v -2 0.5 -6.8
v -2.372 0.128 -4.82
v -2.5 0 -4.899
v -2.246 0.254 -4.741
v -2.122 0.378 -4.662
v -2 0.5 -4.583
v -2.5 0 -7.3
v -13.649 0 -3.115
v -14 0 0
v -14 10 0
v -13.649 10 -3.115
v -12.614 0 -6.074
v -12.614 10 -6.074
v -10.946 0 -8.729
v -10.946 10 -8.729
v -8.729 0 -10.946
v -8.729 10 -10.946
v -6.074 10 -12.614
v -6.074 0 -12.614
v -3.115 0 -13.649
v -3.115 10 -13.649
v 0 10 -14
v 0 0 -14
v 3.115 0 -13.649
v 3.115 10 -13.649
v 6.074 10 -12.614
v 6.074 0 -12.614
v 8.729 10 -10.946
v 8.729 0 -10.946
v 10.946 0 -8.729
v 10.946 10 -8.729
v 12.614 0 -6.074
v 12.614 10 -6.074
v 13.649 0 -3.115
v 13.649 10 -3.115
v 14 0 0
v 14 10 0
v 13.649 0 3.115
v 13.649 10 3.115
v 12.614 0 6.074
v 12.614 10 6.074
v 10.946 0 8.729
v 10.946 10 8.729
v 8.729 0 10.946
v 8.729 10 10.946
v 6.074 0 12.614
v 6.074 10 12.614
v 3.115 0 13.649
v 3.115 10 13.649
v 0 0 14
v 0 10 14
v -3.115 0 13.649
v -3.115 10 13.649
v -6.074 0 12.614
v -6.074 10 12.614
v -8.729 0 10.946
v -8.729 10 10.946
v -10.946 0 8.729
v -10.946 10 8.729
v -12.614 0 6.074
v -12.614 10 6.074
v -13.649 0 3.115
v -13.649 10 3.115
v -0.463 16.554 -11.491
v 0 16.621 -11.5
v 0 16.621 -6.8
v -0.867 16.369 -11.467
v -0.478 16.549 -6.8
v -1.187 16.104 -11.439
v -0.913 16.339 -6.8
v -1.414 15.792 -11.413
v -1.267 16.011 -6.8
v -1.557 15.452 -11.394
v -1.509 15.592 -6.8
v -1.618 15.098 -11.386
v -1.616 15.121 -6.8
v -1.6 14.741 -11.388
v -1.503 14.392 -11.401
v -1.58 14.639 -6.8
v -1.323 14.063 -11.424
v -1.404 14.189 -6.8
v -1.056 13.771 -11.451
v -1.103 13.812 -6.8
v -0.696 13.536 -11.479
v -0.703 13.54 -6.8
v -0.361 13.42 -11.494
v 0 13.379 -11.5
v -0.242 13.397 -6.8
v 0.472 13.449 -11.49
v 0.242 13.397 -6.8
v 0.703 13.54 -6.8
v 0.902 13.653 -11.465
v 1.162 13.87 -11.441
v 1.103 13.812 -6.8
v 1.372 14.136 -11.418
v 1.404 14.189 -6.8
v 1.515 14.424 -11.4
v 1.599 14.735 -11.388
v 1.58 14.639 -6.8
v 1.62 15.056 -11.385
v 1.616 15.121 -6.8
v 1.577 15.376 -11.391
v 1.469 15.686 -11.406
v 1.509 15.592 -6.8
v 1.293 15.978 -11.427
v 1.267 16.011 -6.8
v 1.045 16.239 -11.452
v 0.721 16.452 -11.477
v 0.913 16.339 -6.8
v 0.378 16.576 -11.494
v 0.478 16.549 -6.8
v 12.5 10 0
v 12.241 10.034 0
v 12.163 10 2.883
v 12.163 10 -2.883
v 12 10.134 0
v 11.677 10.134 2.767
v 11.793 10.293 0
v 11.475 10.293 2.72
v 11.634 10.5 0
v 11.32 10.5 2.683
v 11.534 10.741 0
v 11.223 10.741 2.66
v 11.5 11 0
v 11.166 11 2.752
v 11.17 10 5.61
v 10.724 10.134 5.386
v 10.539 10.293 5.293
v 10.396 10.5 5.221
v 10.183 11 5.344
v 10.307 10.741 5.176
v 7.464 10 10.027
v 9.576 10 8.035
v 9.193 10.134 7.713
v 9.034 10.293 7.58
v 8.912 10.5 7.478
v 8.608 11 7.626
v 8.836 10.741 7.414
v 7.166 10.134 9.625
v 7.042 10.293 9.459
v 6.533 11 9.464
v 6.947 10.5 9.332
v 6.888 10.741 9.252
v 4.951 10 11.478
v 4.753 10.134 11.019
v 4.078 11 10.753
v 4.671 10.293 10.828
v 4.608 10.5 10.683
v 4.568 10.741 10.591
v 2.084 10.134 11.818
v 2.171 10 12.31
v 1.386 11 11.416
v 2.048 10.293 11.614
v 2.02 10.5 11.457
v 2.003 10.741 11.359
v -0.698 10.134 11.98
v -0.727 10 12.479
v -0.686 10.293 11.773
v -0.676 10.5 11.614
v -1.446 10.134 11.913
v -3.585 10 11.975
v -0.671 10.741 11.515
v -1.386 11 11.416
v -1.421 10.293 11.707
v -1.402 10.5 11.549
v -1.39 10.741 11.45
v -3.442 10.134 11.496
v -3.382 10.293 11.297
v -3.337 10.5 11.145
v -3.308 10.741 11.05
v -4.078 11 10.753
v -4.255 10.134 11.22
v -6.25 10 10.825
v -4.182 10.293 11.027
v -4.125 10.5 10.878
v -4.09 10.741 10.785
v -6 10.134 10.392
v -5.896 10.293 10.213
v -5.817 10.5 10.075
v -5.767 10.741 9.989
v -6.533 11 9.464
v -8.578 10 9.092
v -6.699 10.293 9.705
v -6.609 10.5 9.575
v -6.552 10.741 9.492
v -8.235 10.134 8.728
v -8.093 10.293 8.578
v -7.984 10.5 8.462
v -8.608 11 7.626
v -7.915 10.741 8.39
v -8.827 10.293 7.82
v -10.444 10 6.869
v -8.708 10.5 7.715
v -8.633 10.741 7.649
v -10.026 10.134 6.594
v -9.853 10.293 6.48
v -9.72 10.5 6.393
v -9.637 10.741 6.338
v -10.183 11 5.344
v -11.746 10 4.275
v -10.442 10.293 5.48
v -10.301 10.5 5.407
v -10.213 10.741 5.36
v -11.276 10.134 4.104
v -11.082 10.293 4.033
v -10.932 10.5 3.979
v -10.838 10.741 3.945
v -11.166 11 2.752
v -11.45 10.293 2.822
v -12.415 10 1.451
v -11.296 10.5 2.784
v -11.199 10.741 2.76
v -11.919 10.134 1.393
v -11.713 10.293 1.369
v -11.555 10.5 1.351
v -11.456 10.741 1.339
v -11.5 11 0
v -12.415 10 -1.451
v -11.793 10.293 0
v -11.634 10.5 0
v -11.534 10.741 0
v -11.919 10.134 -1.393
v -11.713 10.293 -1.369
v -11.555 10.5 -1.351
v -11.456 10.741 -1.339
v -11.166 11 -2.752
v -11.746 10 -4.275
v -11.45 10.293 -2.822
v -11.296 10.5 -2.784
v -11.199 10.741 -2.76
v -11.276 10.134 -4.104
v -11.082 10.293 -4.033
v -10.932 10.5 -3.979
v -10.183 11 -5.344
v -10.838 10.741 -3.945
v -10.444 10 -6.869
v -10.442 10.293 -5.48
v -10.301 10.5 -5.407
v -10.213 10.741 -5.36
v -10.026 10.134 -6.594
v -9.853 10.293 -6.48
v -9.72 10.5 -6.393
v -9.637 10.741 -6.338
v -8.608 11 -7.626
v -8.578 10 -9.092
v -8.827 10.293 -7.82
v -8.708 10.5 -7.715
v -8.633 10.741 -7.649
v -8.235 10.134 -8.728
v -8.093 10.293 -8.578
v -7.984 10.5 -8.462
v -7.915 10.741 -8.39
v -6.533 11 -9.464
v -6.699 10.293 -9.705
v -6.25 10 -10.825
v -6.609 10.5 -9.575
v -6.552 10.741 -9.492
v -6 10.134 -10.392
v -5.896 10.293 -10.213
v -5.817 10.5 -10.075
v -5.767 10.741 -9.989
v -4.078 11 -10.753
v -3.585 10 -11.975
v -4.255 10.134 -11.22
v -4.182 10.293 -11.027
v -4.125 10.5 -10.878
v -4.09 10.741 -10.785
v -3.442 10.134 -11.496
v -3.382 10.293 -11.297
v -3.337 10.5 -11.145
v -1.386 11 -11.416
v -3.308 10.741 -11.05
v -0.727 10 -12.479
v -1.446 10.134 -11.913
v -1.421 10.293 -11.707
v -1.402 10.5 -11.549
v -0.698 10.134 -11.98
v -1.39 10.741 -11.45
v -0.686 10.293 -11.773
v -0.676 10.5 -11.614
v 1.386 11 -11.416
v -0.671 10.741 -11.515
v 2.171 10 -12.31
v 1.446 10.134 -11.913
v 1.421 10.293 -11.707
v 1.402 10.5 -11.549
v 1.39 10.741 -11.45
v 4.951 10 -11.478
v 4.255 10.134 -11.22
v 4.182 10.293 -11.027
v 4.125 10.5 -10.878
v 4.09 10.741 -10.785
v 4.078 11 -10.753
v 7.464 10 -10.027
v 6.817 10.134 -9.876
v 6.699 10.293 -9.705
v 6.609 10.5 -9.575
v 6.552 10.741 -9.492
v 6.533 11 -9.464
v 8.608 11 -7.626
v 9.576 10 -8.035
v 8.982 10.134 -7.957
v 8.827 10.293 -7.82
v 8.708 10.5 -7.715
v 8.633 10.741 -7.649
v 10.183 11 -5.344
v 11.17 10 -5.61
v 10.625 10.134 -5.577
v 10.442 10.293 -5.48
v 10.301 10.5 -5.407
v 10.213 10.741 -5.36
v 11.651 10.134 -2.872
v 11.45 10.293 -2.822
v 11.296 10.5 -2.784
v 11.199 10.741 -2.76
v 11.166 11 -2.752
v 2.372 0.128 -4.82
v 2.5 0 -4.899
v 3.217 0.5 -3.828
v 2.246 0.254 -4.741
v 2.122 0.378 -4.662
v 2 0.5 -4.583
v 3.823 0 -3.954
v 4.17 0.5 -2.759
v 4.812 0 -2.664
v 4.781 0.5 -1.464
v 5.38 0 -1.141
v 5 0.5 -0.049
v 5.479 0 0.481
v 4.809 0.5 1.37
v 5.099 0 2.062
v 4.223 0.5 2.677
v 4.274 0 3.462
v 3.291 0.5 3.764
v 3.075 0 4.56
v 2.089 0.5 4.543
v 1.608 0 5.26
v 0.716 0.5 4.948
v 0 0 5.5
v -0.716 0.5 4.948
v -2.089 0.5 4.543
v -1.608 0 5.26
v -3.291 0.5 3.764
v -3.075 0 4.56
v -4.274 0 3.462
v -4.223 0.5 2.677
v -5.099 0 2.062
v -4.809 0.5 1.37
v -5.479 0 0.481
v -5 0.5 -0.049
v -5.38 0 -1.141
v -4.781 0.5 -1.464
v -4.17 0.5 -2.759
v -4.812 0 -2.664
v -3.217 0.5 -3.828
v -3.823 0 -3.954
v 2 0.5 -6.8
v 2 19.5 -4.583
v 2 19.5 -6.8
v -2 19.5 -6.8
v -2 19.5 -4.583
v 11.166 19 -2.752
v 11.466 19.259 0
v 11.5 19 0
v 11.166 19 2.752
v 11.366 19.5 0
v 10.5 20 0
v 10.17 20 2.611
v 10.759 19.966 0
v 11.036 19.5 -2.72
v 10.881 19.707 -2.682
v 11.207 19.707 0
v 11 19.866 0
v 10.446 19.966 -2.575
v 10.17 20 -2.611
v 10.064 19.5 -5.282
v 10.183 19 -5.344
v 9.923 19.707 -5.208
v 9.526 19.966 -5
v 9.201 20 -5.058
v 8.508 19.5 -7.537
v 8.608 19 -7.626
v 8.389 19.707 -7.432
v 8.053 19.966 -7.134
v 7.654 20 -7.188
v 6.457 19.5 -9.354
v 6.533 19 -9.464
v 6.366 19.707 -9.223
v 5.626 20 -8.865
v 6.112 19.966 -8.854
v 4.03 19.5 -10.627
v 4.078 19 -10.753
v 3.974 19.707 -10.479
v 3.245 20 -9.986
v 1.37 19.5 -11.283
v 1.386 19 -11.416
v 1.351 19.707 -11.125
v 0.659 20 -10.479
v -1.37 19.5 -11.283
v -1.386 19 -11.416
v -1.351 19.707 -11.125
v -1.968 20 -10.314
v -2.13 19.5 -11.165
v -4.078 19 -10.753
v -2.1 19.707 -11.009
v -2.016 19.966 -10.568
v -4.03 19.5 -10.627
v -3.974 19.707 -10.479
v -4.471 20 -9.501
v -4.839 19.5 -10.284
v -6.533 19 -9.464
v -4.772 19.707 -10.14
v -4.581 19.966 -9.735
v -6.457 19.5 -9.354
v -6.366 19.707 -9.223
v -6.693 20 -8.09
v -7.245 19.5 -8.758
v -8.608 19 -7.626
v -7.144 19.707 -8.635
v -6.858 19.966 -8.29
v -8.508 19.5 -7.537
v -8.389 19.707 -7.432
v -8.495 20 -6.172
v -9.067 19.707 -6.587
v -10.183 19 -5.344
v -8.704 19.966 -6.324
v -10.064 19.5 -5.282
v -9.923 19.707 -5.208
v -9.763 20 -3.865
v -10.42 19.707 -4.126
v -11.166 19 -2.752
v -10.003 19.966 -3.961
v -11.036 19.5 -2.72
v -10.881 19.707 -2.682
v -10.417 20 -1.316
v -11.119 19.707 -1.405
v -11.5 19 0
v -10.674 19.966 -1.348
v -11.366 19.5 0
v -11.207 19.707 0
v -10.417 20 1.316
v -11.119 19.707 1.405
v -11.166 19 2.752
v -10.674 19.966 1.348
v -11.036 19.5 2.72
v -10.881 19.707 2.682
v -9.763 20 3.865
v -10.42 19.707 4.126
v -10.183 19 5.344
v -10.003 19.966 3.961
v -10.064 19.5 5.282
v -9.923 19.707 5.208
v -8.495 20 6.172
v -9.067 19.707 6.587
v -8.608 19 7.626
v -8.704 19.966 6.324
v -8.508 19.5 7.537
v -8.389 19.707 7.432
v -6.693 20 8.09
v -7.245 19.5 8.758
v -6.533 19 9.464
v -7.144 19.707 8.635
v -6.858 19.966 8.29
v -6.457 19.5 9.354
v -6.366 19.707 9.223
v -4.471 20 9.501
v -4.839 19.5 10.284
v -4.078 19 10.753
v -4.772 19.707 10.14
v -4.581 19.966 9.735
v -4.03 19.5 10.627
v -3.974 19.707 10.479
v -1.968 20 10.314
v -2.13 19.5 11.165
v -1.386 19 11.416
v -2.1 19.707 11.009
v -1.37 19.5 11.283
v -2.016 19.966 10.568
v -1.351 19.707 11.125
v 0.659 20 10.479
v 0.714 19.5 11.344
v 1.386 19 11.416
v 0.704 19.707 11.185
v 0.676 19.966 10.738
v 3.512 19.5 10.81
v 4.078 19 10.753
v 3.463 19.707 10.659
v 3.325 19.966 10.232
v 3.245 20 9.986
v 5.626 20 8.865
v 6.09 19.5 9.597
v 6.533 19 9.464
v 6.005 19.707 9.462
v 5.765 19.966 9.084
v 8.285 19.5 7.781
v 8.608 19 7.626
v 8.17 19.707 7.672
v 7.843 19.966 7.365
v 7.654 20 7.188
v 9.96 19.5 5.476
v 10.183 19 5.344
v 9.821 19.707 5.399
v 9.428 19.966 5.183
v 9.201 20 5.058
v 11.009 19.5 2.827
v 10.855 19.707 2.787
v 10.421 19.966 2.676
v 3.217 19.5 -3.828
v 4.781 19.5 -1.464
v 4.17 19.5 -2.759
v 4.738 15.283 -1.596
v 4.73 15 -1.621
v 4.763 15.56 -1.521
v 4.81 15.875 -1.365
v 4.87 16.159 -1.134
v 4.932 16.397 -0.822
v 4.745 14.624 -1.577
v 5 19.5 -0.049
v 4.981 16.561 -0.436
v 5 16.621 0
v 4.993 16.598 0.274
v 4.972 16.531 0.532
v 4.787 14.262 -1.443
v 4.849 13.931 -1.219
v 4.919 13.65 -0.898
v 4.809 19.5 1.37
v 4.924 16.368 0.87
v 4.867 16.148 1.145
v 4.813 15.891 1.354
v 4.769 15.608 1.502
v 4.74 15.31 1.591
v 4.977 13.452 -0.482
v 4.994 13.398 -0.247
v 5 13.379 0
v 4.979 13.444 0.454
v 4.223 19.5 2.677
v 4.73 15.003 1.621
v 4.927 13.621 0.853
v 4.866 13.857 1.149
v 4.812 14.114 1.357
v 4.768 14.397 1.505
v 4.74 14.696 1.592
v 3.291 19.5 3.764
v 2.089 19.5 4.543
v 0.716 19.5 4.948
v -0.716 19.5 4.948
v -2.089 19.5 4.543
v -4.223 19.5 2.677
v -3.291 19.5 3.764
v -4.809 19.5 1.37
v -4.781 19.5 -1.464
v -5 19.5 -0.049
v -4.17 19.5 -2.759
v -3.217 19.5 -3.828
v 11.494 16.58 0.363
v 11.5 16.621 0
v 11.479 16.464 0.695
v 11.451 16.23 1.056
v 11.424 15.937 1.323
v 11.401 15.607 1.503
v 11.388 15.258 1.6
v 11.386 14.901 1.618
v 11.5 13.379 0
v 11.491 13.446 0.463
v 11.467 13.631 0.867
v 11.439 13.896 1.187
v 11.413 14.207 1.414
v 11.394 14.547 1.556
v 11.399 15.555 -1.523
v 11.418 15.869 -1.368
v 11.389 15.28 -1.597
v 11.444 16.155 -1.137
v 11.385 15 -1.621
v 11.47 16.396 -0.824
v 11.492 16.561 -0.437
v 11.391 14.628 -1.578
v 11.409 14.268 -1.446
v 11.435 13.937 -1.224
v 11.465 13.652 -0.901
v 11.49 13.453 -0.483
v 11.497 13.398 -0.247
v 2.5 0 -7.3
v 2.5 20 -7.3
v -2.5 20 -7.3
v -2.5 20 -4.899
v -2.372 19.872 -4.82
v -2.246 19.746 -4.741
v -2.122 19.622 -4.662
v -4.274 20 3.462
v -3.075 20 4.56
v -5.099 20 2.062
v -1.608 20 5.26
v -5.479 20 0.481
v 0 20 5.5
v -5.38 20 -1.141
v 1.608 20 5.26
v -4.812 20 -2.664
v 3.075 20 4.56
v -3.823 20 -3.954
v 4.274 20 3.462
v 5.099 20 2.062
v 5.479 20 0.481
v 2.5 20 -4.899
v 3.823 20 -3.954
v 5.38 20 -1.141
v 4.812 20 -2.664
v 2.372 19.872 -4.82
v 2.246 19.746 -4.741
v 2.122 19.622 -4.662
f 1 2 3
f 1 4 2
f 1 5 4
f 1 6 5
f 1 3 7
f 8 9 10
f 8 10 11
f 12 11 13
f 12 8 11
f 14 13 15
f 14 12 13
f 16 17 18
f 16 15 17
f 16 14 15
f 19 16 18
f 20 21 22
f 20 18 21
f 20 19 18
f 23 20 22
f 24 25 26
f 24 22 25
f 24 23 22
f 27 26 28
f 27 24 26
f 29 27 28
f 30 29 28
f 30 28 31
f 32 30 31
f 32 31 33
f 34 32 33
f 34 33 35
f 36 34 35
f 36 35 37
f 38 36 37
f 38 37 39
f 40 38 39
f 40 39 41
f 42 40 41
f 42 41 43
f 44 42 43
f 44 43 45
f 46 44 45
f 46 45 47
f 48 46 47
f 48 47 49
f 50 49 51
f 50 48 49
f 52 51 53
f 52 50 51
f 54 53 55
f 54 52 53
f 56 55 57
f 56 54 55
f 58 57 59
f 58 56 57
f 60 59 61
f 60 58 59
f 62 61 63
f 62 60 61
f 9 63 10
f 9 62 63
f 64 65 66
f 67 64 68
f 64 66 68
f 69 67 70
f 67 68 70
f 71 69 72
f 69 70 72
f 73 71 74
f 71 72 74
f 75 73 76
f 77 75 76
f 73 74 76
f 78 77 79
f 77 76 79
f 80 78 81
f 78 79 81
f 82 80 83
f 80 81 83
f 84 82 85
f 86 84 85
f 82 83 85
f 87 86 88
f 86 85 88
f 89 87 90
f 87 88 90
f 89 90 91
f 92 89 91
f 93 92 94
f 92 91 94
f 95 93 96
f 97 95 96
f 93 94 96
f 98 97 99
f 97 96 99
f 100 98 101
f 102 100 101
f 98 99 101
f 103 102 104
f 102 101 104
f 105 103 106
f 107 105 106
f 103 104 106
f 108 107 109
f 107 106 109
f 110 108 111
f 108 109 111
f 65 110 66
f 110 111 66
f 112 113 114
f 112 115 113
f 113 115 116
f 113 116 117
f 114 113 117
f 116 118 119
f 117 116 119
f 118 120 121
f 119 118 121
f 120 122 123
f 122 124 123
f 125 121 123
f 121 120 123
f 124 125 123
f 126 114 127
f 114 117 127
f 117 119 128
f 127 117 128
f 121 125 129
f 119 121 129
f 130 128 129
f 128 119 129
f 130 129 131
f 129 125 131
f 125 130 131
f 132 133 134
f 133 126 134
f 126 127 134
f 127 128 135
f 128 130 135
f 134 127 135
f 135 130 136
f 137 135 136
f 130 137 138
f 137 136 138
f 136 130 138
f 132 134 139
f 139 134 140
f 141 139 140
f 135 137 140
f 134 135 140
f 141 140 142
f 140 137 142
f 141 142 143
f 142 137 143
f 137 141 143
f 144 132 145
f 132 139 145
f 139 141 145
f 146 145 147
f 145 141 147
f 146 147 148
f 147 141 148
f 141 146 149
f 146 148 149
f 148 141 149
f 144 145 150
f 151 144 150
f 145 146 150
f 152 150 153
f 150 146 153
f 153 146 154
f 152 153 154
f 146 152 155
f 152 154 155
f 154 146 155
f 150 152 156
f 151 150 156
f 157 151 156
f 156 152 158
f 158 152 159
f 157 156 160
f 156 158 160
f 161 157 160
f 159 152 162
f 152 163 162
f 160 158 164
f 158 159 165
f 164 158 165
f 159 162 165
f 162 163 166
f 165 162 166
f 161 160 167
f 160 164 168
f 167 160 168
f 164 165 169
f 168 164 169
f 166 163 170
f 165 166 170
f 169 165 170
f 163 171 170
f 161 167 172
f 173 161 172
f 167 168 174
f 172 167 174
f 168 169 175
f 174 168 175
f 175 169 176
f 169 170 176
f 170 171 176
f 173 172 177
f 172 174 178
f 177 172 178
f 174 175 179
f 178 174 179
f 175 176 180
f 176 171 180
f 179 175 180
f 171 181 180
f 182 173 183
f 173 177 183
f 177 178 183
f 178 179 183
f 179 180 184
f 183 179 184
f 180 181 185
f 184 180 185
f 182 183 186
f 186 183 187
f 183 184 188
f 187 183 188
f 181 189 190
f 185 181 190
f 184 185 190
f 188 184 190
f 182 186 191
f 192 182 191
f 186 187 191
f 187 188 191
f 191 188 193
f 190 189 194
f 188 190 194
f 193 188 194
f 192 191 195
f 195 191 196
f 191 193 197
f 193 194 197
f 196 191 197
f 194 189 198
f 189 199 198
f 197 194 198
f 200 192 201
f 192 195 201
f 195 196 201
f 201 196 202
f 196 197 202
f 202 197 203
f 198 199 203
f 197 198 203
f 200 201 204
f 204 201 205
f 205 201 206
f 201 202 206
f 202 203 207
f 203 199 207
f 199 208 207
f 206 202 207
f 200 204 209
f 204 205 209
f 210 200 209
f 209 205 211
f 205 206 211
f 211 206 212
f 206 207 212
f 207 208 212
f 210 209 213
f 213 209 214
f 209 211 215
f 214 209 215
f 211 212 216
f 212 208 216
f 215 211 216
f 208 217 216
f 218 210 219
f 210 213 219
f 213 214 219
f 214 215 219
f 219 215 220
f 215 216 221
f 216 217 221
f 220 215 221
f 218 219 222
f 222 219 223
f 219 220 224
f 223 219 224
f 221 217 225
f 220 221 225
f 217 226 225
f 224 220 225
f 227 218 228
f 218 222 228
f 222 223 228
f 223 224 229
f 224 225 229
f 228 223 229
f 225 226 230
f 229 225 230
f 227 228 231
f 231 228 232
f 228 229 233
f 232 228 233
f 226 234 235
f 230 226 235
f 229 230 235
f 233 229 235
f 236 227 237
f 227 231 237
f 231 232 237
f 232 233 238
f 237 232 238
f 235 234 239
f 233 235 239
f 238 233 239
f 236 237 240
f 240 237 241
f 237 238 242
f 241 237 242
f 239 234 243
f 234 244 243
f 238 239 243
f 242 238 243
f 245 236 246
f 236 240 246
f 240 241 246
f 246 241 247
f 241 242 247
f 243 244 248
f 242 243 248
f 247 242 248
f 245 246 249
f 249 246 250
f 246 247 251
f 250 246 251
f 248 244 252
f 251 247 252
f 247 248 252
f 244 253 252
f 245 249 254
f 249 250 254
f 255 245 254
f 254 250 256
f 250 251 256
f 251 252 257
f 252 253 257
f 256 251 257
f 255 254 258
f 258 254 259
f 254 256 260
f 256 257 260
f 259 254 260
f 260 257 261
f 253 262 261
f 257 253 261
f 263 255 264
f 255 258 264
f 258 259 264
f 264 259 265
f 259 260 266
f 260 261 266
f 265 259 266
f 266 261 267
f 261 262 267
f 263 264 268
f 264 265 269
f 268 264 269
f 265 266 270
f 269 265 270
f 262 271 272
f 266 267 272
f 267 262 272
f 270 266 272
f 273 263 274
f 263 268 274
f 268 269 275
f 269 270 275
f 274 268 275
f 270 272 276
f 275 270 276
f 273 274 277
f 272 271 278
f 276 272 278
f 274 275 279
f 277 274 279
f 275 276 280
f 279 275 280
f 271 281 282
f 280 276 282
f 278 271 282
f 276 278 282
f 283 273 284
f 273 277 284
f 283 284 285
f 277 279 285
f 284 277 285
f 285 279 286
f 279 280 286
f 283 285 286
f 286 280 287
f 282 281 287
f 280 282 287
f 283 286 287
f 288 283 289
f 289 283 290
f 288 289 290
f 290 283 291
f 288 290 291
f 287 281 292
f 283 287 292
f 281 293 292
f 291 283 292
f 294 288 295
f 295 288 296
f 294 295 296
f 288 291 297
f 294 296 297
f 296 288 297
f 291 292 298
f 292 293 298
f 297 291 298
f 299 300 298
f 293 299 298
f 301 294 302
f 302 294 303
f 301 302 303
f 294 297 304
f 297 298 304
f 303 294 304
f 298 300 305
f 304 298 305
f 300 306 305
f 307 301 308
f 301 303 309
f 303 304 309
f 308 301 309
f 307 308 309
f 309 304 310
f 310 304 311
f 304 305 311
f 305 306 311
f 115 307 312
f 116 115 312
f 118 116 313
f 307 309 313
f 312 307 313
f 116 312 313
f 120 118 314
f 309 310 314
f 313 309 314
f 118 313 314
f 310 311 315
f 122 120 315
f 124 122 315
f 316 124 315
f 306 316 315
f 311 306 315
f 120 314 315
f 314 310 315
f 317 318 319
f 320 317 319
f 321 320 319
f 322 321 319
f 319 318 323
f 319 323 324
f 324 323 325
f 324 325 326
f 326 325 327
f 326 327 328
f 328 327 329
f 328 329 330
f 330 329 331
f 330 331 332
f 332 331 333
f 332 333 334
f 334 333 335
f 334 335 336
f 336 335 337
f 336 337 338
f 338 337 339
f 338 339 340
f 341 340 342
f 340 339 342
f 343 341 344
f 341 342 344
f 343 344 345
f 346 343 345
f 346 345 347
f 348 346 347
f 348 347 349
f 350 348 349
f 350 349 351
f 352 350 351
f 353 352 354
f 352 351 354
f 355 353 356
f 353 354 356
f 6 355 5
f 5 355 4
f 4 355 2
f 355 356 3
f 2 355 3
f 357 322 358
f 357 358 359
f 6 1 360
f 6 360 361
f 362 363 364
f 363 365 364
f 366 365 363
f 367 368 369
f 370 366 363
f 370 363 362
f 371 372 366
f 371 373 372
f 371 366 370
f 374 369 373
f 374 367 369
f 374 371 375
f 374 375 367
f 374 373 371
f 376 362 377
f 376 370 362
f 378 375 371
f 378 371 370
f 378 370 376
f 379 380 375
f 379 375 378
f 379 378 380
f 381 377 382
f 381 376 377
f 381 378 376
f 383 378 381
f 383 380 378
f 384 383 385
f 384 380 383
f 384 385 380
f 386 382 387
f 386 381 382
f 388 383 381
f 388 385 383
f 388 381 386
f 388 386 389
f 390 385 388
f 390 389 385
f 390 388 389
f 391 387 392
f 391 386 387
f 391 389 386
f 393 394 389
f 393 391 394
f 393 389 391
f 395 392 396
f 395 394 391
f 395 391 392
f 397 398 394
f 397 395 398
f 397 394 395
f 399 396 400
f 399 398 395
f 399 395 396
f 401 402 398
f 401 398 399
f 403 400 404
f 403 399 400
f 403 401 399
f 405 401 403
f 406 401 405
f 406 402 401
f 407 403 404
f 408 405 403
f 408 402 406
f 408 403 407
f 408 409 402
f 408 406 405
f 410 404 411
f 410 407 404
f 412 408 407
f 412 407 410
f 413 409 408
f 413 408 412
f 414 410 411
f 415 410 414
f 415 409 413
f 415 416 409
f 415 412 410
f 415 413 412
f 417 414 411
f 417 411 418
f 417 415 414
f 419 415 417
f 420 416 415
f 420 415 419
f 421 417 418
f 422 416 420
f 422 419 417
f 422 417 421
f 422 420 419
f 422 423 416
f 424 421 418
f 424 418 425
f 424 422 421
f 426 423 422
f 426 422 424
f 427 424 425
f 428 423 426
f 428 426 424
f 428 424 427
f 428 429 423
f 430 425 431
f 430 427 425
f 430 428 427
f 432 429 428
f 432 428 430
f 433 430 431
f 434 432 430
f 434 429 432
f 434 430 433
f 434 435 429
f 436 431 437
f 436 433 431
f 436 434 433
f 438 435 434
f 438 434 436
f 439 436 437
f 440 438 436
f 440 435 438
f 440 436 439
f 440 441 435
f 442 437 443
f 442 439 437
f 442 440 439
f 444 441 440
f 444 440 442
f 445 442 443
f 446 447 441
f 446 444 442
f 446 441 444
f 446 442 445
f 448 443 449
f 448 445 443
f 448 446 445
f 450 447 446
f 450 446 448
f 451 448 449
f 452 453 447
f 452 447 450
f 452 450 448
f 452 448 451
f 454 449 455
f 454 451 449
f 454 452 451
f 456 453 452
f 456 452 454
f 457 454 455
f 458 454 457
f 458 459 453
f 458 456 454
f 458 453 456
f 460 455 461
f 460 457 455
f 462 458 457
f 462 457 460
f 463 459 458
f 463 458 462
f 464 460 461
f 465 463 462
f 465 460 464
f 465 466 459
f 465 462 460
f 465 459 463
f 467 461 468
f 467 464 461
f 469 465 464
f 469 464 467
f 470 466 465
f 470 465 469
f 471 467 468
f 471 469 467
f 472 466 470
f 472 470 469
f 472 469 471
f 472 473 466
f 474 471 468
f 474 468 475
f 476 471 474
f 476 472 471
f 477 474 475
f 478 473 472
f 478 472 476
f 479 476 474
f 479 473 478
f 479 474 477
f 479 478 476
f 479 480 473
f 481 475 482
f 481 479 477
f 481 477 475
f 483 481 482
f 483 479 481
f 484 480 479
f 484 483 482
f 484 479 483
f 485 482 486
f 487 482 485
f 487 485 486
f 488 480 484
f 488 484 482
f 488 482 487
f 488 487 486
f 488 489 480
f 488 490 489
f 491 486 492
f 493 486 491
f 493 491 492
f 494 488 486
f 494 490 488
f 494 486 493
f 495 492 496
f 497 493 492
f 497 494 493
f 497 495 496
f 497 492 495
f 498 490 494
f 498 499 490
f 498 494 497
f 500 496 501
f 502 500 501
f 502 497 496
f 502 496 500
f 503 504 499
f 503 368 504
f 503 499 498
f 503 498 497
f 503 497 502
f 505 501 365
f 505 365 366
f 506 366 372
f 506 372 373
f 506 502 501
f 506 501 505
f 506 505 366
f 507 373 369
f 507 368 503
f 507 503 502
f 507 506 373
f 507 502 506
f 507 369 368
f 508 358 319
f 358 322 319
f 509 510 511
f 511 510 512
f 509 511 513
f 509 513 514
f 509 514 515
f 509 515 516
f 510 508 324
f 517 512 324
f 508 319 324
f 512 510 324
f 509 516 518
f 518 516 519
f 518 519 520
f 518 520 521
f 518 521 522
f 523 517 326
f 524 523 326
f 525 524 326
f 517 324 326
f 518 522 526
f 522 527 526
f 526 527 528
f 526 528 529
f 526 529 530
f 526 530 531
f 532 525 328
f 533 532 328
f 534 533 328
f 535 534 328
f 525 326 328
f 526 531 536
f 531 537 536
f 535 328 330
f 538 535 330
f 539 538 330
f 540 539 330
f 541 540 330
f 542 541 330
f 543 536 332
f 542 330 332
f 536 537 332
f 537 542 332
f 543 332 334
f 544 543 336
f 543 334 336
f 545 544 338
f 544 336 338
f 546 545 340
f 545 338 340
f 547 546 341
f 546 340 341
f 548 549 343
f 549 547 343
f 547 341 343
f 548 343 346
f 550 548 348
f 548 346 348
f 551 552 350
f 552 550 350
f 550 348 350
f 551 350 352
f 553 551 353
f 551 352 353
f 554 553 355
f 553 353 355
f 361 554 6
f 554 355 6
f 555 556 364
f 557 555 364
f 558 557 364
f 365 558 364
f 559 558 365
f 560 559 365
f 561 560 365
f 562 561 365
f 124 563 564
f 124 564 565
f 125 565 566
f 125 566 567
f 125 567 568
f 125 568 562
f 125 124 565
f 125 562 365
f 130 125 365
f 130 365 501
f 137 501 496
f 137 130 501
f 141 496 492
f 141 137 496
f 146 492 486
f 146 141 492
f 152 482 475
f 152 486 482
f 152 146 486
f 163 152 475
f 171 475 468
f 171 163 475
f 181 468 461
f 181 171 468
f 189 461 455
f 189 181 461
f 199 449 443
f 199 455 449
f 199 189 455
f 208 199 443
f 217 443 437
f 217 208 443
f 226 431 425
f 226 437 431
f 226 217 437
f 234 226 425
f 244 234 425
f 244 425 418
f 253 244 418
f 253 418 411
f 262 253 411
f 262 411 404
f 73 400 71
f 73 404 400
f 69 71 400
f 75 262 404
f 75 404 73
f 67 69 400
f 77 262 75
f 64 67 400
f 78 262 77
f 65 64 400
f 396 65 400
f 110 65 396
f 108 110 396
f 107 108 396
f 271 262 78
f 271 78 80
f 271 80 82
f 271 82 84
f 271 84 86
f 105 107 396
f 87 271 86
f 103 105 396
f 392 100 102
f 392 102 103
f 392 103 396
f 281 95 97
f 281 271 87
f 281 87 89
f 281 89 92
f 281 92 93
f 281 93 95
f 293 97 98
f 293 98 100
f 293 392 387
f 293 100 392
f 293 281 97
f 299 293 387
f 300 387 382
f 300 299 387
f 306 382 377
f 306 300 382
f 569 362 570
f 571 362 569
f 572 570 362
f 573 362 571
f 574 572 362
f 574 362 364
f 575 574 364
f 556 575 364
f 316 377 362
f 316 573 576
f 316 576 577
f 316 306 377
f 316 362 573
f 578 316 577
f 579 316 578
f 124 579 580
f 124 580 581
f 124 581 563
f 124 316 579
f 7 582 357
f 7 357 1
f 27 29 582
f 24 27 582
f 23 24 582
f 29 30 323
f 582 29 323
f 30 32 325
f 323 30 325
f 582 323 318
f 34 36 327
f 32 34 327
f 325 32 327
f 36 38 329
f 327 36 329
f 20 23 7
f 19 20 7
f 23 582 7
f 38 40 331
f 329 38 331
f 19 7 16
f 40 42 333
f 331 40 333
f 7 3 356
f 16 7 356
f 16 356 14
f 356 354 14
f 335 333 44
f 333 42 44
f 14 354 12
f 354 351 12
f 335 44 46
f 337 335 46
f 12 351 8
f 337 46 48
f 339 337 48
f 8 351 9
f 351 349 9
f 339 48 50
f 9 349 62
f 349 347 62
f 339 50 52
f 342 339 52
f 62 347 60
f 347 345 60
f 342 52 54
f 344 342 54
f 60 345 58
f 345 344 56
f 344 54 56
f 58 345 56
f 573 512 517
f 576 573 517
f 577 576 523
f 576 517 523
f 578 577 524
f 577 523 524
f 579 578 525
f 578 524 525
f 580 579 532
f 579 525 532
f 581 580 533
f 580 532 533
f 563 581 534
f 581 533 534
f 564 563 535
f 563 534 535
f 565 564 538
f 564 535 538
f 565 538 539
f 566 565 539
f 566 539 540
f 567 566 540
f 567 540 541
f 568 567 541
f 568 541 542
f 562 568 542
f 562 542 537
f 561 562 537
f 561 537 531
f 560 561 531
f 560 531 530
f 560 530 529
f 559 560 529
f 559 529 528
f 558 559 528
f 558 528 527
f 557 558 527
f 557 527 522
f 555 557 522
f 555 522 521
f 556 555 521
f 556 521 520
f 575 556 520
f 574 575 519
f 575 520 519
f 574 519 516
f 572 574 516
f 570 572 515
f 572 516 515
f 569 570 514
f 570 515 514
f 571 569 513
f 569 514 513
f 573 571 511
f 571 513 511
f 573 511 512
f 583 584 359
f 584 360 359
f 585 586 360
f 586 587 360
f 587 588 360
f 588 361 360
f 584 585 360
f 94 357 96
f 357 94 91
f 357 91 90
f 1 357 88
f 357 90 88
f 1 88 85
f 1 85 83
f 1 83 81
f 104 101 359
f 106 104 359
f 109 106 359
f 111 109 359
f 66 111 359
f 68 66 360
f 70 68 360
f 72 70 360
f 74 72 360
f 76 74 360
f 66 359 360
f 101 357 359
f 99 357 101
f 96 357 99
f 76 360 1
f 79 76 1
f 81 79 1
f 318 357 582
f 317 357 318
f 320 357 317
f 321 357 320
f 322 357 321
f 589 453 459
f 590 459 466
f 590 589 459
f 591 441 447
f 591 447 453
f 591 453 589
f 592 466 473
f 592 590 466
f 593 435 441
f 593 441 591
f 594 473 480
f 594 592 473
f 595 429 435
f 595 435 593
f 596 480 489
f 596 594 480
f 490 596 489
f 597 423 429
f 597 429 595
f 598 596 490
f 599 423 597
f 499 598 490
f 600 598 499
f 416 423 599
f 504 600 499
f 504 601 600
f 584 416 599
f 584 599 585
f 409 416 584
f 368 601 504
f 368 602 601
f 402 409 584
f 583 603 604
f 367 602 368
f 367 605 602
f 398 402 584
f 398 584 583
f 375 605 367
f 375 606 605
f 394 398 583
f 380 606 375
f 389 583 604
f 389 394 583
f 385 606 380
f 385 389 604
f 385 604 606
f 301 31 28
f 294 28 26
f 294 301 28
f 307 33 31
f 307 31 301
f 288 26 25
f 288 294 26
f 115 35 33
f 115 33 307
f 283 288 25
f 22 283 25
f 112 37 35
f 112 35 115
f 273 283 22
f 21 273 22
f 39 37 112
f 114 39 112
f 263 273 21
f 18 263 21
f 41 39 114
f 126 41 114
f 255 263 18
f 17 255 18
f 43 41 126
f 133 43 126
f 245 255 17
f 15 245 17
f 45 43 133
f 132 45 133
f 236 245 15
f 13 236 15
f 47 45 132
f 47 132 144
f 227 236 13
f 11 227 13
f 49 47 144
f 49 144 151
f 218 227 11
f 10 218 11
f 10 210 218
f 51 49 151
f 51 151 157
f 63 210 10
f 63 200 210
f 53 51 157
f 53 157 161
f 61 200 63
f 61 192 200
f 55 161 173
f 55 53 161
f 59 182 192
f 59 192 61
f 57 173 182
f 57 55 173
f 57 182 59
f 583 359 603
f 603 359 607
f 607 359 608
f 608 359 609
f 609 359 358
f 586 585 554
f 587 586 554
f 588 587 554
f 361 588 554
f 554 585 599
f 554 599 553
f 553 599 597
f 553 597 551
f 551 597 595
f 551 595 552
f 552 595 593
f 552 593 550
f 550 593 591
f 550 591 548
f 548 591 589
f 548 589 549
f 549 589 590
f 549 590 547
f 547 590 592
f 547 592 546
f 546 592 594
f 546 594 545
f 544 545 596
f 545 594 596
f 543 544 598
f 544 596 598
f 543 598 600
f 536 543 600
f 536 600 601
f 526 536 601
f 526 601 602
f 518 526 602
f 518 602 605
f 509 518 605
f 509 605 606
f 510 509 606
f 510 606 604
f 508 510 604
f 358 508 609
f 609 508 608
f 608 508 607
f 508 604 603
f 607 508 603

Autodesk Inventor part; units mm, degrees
ref_plane "XZ Plane" through (0, 0, 0) normal (0, 1, 0) x (-1, 0, 0)
sketch "Sketch1" plane through (0, 0, 0) normal (0, 1, 0) x (-1, 0, 0)
  circle A0 centre (0, 0) radius 5
  circle A1 centre (0, 0) radius 14
  dimension "d0" = 10
  dimension "d1" = 28
extrude "Extrusion1" add sketch "Sketch1" along normal blind 10
sketch "Sketch2" plane through (0, 10, 0) normal (0, 1, 0) x (1, 0, 0)
  circle A0 centre (0, 0) radius 11.5
  circle A1 centre (0, 0) radius 5 projected
  dimension "d4" = 23
extrude "Extrusion2" add sketch "Sketch2" along normal blind 10
fillet "Fillet1" radius 1 1 edges at (-11.5, 10, 0)
ref_plane "Work Plane1" through (11.5, 10, 0) normal (1, 0, 0) x (0, 1, 0)
fillet "Fillet2" radius 1 1 edges at (-11.5, 20, 0)
ref_plane "Work Plane2" through (0, 10, -11.5) normal (0, 0, 1) x (1, 0, 0)
sketch "Sketch4" plane through (0, 10, -11.5) normal (0, 0, 1) x (1, 0, 0)
  line L0 (-10.5, 10) -> (10.5, 10) projected
  point P0 (0, -10)
  point P1 (0, 5)
  dimension "d21" = 5
  dimension "d22" = 0
sketch "Sketch3" plane through (11.5, 10, 0) normal (1, 0, 0) x (0, 1, 0)
  line L0 (10, -11.5) -> (10, 11.5) projected
  point P0 (-10, 0)
  point P1 (5, 0)
  dimension "d8" = 5
  dimension "d9" = 0
hole "Hole1" at (11.5, 15, 0) direction (-1, 0, 0) diameter 3.242 end up to surface thread size "M4x0.7" class "6H" standard "ISO Metric profile"
hole "Hole2" at (0, 15, -11.5) direction (0, 0, 1) diameter 3.242 end up to surface thread size "M4x0.7" class "6H" standard "ISO Metric profile"
sketch "Sketch5" plane through (0, 20, 0) normal (0, 1, 0) x (1, 0, 0)
  line L0 (-2, 4.5826) -> (2, 4.5826)
  line L1 (2, 4.5826) -> (2, 6.8)
  line L2 (2, 6.8) -> (-2, 6.8)
  line L3 (-2, 6.8) -> (-2, 4.5826)
  circle A0 centre (0, 0) radius 5 projected
  dimension "d30" = 4
  dimension "d31" = 6.8
extrude "Extrusion3" cut sketch "Sketch5" against normal through all contours A0 L0 | L3 L2 L1 A0 picked at (0.3405, 4.6866)
chamfer "Chamfer2" distance 0.5 angle 45 8 edges at (-2, 20, -5.6913) (0, 20, -6.8) (2, 20, -5.6913) (0, 20, 5) (0, 0, -6.8) (-2, 0, -5.6913) (2, 0, -5.6913) (0, 0, 5)
sketch "Sketch6" plane through (0, 0, 0) normal (0, -1, 0) x (1, 0, 0)
  circle A0 centre (0, 0) radius 15
  dimension "d37" = 30
sketch "Sketch7" plane through (0, 10, 0) normal (0, 1, 0) x (1, 0, 0)
  circle A0 centre (0, 0) radius 15
  dimension "d38" = 30
properties part number "gear_khk_SUS1-28J10" material "Steel, High Strength, Low Alloy"
